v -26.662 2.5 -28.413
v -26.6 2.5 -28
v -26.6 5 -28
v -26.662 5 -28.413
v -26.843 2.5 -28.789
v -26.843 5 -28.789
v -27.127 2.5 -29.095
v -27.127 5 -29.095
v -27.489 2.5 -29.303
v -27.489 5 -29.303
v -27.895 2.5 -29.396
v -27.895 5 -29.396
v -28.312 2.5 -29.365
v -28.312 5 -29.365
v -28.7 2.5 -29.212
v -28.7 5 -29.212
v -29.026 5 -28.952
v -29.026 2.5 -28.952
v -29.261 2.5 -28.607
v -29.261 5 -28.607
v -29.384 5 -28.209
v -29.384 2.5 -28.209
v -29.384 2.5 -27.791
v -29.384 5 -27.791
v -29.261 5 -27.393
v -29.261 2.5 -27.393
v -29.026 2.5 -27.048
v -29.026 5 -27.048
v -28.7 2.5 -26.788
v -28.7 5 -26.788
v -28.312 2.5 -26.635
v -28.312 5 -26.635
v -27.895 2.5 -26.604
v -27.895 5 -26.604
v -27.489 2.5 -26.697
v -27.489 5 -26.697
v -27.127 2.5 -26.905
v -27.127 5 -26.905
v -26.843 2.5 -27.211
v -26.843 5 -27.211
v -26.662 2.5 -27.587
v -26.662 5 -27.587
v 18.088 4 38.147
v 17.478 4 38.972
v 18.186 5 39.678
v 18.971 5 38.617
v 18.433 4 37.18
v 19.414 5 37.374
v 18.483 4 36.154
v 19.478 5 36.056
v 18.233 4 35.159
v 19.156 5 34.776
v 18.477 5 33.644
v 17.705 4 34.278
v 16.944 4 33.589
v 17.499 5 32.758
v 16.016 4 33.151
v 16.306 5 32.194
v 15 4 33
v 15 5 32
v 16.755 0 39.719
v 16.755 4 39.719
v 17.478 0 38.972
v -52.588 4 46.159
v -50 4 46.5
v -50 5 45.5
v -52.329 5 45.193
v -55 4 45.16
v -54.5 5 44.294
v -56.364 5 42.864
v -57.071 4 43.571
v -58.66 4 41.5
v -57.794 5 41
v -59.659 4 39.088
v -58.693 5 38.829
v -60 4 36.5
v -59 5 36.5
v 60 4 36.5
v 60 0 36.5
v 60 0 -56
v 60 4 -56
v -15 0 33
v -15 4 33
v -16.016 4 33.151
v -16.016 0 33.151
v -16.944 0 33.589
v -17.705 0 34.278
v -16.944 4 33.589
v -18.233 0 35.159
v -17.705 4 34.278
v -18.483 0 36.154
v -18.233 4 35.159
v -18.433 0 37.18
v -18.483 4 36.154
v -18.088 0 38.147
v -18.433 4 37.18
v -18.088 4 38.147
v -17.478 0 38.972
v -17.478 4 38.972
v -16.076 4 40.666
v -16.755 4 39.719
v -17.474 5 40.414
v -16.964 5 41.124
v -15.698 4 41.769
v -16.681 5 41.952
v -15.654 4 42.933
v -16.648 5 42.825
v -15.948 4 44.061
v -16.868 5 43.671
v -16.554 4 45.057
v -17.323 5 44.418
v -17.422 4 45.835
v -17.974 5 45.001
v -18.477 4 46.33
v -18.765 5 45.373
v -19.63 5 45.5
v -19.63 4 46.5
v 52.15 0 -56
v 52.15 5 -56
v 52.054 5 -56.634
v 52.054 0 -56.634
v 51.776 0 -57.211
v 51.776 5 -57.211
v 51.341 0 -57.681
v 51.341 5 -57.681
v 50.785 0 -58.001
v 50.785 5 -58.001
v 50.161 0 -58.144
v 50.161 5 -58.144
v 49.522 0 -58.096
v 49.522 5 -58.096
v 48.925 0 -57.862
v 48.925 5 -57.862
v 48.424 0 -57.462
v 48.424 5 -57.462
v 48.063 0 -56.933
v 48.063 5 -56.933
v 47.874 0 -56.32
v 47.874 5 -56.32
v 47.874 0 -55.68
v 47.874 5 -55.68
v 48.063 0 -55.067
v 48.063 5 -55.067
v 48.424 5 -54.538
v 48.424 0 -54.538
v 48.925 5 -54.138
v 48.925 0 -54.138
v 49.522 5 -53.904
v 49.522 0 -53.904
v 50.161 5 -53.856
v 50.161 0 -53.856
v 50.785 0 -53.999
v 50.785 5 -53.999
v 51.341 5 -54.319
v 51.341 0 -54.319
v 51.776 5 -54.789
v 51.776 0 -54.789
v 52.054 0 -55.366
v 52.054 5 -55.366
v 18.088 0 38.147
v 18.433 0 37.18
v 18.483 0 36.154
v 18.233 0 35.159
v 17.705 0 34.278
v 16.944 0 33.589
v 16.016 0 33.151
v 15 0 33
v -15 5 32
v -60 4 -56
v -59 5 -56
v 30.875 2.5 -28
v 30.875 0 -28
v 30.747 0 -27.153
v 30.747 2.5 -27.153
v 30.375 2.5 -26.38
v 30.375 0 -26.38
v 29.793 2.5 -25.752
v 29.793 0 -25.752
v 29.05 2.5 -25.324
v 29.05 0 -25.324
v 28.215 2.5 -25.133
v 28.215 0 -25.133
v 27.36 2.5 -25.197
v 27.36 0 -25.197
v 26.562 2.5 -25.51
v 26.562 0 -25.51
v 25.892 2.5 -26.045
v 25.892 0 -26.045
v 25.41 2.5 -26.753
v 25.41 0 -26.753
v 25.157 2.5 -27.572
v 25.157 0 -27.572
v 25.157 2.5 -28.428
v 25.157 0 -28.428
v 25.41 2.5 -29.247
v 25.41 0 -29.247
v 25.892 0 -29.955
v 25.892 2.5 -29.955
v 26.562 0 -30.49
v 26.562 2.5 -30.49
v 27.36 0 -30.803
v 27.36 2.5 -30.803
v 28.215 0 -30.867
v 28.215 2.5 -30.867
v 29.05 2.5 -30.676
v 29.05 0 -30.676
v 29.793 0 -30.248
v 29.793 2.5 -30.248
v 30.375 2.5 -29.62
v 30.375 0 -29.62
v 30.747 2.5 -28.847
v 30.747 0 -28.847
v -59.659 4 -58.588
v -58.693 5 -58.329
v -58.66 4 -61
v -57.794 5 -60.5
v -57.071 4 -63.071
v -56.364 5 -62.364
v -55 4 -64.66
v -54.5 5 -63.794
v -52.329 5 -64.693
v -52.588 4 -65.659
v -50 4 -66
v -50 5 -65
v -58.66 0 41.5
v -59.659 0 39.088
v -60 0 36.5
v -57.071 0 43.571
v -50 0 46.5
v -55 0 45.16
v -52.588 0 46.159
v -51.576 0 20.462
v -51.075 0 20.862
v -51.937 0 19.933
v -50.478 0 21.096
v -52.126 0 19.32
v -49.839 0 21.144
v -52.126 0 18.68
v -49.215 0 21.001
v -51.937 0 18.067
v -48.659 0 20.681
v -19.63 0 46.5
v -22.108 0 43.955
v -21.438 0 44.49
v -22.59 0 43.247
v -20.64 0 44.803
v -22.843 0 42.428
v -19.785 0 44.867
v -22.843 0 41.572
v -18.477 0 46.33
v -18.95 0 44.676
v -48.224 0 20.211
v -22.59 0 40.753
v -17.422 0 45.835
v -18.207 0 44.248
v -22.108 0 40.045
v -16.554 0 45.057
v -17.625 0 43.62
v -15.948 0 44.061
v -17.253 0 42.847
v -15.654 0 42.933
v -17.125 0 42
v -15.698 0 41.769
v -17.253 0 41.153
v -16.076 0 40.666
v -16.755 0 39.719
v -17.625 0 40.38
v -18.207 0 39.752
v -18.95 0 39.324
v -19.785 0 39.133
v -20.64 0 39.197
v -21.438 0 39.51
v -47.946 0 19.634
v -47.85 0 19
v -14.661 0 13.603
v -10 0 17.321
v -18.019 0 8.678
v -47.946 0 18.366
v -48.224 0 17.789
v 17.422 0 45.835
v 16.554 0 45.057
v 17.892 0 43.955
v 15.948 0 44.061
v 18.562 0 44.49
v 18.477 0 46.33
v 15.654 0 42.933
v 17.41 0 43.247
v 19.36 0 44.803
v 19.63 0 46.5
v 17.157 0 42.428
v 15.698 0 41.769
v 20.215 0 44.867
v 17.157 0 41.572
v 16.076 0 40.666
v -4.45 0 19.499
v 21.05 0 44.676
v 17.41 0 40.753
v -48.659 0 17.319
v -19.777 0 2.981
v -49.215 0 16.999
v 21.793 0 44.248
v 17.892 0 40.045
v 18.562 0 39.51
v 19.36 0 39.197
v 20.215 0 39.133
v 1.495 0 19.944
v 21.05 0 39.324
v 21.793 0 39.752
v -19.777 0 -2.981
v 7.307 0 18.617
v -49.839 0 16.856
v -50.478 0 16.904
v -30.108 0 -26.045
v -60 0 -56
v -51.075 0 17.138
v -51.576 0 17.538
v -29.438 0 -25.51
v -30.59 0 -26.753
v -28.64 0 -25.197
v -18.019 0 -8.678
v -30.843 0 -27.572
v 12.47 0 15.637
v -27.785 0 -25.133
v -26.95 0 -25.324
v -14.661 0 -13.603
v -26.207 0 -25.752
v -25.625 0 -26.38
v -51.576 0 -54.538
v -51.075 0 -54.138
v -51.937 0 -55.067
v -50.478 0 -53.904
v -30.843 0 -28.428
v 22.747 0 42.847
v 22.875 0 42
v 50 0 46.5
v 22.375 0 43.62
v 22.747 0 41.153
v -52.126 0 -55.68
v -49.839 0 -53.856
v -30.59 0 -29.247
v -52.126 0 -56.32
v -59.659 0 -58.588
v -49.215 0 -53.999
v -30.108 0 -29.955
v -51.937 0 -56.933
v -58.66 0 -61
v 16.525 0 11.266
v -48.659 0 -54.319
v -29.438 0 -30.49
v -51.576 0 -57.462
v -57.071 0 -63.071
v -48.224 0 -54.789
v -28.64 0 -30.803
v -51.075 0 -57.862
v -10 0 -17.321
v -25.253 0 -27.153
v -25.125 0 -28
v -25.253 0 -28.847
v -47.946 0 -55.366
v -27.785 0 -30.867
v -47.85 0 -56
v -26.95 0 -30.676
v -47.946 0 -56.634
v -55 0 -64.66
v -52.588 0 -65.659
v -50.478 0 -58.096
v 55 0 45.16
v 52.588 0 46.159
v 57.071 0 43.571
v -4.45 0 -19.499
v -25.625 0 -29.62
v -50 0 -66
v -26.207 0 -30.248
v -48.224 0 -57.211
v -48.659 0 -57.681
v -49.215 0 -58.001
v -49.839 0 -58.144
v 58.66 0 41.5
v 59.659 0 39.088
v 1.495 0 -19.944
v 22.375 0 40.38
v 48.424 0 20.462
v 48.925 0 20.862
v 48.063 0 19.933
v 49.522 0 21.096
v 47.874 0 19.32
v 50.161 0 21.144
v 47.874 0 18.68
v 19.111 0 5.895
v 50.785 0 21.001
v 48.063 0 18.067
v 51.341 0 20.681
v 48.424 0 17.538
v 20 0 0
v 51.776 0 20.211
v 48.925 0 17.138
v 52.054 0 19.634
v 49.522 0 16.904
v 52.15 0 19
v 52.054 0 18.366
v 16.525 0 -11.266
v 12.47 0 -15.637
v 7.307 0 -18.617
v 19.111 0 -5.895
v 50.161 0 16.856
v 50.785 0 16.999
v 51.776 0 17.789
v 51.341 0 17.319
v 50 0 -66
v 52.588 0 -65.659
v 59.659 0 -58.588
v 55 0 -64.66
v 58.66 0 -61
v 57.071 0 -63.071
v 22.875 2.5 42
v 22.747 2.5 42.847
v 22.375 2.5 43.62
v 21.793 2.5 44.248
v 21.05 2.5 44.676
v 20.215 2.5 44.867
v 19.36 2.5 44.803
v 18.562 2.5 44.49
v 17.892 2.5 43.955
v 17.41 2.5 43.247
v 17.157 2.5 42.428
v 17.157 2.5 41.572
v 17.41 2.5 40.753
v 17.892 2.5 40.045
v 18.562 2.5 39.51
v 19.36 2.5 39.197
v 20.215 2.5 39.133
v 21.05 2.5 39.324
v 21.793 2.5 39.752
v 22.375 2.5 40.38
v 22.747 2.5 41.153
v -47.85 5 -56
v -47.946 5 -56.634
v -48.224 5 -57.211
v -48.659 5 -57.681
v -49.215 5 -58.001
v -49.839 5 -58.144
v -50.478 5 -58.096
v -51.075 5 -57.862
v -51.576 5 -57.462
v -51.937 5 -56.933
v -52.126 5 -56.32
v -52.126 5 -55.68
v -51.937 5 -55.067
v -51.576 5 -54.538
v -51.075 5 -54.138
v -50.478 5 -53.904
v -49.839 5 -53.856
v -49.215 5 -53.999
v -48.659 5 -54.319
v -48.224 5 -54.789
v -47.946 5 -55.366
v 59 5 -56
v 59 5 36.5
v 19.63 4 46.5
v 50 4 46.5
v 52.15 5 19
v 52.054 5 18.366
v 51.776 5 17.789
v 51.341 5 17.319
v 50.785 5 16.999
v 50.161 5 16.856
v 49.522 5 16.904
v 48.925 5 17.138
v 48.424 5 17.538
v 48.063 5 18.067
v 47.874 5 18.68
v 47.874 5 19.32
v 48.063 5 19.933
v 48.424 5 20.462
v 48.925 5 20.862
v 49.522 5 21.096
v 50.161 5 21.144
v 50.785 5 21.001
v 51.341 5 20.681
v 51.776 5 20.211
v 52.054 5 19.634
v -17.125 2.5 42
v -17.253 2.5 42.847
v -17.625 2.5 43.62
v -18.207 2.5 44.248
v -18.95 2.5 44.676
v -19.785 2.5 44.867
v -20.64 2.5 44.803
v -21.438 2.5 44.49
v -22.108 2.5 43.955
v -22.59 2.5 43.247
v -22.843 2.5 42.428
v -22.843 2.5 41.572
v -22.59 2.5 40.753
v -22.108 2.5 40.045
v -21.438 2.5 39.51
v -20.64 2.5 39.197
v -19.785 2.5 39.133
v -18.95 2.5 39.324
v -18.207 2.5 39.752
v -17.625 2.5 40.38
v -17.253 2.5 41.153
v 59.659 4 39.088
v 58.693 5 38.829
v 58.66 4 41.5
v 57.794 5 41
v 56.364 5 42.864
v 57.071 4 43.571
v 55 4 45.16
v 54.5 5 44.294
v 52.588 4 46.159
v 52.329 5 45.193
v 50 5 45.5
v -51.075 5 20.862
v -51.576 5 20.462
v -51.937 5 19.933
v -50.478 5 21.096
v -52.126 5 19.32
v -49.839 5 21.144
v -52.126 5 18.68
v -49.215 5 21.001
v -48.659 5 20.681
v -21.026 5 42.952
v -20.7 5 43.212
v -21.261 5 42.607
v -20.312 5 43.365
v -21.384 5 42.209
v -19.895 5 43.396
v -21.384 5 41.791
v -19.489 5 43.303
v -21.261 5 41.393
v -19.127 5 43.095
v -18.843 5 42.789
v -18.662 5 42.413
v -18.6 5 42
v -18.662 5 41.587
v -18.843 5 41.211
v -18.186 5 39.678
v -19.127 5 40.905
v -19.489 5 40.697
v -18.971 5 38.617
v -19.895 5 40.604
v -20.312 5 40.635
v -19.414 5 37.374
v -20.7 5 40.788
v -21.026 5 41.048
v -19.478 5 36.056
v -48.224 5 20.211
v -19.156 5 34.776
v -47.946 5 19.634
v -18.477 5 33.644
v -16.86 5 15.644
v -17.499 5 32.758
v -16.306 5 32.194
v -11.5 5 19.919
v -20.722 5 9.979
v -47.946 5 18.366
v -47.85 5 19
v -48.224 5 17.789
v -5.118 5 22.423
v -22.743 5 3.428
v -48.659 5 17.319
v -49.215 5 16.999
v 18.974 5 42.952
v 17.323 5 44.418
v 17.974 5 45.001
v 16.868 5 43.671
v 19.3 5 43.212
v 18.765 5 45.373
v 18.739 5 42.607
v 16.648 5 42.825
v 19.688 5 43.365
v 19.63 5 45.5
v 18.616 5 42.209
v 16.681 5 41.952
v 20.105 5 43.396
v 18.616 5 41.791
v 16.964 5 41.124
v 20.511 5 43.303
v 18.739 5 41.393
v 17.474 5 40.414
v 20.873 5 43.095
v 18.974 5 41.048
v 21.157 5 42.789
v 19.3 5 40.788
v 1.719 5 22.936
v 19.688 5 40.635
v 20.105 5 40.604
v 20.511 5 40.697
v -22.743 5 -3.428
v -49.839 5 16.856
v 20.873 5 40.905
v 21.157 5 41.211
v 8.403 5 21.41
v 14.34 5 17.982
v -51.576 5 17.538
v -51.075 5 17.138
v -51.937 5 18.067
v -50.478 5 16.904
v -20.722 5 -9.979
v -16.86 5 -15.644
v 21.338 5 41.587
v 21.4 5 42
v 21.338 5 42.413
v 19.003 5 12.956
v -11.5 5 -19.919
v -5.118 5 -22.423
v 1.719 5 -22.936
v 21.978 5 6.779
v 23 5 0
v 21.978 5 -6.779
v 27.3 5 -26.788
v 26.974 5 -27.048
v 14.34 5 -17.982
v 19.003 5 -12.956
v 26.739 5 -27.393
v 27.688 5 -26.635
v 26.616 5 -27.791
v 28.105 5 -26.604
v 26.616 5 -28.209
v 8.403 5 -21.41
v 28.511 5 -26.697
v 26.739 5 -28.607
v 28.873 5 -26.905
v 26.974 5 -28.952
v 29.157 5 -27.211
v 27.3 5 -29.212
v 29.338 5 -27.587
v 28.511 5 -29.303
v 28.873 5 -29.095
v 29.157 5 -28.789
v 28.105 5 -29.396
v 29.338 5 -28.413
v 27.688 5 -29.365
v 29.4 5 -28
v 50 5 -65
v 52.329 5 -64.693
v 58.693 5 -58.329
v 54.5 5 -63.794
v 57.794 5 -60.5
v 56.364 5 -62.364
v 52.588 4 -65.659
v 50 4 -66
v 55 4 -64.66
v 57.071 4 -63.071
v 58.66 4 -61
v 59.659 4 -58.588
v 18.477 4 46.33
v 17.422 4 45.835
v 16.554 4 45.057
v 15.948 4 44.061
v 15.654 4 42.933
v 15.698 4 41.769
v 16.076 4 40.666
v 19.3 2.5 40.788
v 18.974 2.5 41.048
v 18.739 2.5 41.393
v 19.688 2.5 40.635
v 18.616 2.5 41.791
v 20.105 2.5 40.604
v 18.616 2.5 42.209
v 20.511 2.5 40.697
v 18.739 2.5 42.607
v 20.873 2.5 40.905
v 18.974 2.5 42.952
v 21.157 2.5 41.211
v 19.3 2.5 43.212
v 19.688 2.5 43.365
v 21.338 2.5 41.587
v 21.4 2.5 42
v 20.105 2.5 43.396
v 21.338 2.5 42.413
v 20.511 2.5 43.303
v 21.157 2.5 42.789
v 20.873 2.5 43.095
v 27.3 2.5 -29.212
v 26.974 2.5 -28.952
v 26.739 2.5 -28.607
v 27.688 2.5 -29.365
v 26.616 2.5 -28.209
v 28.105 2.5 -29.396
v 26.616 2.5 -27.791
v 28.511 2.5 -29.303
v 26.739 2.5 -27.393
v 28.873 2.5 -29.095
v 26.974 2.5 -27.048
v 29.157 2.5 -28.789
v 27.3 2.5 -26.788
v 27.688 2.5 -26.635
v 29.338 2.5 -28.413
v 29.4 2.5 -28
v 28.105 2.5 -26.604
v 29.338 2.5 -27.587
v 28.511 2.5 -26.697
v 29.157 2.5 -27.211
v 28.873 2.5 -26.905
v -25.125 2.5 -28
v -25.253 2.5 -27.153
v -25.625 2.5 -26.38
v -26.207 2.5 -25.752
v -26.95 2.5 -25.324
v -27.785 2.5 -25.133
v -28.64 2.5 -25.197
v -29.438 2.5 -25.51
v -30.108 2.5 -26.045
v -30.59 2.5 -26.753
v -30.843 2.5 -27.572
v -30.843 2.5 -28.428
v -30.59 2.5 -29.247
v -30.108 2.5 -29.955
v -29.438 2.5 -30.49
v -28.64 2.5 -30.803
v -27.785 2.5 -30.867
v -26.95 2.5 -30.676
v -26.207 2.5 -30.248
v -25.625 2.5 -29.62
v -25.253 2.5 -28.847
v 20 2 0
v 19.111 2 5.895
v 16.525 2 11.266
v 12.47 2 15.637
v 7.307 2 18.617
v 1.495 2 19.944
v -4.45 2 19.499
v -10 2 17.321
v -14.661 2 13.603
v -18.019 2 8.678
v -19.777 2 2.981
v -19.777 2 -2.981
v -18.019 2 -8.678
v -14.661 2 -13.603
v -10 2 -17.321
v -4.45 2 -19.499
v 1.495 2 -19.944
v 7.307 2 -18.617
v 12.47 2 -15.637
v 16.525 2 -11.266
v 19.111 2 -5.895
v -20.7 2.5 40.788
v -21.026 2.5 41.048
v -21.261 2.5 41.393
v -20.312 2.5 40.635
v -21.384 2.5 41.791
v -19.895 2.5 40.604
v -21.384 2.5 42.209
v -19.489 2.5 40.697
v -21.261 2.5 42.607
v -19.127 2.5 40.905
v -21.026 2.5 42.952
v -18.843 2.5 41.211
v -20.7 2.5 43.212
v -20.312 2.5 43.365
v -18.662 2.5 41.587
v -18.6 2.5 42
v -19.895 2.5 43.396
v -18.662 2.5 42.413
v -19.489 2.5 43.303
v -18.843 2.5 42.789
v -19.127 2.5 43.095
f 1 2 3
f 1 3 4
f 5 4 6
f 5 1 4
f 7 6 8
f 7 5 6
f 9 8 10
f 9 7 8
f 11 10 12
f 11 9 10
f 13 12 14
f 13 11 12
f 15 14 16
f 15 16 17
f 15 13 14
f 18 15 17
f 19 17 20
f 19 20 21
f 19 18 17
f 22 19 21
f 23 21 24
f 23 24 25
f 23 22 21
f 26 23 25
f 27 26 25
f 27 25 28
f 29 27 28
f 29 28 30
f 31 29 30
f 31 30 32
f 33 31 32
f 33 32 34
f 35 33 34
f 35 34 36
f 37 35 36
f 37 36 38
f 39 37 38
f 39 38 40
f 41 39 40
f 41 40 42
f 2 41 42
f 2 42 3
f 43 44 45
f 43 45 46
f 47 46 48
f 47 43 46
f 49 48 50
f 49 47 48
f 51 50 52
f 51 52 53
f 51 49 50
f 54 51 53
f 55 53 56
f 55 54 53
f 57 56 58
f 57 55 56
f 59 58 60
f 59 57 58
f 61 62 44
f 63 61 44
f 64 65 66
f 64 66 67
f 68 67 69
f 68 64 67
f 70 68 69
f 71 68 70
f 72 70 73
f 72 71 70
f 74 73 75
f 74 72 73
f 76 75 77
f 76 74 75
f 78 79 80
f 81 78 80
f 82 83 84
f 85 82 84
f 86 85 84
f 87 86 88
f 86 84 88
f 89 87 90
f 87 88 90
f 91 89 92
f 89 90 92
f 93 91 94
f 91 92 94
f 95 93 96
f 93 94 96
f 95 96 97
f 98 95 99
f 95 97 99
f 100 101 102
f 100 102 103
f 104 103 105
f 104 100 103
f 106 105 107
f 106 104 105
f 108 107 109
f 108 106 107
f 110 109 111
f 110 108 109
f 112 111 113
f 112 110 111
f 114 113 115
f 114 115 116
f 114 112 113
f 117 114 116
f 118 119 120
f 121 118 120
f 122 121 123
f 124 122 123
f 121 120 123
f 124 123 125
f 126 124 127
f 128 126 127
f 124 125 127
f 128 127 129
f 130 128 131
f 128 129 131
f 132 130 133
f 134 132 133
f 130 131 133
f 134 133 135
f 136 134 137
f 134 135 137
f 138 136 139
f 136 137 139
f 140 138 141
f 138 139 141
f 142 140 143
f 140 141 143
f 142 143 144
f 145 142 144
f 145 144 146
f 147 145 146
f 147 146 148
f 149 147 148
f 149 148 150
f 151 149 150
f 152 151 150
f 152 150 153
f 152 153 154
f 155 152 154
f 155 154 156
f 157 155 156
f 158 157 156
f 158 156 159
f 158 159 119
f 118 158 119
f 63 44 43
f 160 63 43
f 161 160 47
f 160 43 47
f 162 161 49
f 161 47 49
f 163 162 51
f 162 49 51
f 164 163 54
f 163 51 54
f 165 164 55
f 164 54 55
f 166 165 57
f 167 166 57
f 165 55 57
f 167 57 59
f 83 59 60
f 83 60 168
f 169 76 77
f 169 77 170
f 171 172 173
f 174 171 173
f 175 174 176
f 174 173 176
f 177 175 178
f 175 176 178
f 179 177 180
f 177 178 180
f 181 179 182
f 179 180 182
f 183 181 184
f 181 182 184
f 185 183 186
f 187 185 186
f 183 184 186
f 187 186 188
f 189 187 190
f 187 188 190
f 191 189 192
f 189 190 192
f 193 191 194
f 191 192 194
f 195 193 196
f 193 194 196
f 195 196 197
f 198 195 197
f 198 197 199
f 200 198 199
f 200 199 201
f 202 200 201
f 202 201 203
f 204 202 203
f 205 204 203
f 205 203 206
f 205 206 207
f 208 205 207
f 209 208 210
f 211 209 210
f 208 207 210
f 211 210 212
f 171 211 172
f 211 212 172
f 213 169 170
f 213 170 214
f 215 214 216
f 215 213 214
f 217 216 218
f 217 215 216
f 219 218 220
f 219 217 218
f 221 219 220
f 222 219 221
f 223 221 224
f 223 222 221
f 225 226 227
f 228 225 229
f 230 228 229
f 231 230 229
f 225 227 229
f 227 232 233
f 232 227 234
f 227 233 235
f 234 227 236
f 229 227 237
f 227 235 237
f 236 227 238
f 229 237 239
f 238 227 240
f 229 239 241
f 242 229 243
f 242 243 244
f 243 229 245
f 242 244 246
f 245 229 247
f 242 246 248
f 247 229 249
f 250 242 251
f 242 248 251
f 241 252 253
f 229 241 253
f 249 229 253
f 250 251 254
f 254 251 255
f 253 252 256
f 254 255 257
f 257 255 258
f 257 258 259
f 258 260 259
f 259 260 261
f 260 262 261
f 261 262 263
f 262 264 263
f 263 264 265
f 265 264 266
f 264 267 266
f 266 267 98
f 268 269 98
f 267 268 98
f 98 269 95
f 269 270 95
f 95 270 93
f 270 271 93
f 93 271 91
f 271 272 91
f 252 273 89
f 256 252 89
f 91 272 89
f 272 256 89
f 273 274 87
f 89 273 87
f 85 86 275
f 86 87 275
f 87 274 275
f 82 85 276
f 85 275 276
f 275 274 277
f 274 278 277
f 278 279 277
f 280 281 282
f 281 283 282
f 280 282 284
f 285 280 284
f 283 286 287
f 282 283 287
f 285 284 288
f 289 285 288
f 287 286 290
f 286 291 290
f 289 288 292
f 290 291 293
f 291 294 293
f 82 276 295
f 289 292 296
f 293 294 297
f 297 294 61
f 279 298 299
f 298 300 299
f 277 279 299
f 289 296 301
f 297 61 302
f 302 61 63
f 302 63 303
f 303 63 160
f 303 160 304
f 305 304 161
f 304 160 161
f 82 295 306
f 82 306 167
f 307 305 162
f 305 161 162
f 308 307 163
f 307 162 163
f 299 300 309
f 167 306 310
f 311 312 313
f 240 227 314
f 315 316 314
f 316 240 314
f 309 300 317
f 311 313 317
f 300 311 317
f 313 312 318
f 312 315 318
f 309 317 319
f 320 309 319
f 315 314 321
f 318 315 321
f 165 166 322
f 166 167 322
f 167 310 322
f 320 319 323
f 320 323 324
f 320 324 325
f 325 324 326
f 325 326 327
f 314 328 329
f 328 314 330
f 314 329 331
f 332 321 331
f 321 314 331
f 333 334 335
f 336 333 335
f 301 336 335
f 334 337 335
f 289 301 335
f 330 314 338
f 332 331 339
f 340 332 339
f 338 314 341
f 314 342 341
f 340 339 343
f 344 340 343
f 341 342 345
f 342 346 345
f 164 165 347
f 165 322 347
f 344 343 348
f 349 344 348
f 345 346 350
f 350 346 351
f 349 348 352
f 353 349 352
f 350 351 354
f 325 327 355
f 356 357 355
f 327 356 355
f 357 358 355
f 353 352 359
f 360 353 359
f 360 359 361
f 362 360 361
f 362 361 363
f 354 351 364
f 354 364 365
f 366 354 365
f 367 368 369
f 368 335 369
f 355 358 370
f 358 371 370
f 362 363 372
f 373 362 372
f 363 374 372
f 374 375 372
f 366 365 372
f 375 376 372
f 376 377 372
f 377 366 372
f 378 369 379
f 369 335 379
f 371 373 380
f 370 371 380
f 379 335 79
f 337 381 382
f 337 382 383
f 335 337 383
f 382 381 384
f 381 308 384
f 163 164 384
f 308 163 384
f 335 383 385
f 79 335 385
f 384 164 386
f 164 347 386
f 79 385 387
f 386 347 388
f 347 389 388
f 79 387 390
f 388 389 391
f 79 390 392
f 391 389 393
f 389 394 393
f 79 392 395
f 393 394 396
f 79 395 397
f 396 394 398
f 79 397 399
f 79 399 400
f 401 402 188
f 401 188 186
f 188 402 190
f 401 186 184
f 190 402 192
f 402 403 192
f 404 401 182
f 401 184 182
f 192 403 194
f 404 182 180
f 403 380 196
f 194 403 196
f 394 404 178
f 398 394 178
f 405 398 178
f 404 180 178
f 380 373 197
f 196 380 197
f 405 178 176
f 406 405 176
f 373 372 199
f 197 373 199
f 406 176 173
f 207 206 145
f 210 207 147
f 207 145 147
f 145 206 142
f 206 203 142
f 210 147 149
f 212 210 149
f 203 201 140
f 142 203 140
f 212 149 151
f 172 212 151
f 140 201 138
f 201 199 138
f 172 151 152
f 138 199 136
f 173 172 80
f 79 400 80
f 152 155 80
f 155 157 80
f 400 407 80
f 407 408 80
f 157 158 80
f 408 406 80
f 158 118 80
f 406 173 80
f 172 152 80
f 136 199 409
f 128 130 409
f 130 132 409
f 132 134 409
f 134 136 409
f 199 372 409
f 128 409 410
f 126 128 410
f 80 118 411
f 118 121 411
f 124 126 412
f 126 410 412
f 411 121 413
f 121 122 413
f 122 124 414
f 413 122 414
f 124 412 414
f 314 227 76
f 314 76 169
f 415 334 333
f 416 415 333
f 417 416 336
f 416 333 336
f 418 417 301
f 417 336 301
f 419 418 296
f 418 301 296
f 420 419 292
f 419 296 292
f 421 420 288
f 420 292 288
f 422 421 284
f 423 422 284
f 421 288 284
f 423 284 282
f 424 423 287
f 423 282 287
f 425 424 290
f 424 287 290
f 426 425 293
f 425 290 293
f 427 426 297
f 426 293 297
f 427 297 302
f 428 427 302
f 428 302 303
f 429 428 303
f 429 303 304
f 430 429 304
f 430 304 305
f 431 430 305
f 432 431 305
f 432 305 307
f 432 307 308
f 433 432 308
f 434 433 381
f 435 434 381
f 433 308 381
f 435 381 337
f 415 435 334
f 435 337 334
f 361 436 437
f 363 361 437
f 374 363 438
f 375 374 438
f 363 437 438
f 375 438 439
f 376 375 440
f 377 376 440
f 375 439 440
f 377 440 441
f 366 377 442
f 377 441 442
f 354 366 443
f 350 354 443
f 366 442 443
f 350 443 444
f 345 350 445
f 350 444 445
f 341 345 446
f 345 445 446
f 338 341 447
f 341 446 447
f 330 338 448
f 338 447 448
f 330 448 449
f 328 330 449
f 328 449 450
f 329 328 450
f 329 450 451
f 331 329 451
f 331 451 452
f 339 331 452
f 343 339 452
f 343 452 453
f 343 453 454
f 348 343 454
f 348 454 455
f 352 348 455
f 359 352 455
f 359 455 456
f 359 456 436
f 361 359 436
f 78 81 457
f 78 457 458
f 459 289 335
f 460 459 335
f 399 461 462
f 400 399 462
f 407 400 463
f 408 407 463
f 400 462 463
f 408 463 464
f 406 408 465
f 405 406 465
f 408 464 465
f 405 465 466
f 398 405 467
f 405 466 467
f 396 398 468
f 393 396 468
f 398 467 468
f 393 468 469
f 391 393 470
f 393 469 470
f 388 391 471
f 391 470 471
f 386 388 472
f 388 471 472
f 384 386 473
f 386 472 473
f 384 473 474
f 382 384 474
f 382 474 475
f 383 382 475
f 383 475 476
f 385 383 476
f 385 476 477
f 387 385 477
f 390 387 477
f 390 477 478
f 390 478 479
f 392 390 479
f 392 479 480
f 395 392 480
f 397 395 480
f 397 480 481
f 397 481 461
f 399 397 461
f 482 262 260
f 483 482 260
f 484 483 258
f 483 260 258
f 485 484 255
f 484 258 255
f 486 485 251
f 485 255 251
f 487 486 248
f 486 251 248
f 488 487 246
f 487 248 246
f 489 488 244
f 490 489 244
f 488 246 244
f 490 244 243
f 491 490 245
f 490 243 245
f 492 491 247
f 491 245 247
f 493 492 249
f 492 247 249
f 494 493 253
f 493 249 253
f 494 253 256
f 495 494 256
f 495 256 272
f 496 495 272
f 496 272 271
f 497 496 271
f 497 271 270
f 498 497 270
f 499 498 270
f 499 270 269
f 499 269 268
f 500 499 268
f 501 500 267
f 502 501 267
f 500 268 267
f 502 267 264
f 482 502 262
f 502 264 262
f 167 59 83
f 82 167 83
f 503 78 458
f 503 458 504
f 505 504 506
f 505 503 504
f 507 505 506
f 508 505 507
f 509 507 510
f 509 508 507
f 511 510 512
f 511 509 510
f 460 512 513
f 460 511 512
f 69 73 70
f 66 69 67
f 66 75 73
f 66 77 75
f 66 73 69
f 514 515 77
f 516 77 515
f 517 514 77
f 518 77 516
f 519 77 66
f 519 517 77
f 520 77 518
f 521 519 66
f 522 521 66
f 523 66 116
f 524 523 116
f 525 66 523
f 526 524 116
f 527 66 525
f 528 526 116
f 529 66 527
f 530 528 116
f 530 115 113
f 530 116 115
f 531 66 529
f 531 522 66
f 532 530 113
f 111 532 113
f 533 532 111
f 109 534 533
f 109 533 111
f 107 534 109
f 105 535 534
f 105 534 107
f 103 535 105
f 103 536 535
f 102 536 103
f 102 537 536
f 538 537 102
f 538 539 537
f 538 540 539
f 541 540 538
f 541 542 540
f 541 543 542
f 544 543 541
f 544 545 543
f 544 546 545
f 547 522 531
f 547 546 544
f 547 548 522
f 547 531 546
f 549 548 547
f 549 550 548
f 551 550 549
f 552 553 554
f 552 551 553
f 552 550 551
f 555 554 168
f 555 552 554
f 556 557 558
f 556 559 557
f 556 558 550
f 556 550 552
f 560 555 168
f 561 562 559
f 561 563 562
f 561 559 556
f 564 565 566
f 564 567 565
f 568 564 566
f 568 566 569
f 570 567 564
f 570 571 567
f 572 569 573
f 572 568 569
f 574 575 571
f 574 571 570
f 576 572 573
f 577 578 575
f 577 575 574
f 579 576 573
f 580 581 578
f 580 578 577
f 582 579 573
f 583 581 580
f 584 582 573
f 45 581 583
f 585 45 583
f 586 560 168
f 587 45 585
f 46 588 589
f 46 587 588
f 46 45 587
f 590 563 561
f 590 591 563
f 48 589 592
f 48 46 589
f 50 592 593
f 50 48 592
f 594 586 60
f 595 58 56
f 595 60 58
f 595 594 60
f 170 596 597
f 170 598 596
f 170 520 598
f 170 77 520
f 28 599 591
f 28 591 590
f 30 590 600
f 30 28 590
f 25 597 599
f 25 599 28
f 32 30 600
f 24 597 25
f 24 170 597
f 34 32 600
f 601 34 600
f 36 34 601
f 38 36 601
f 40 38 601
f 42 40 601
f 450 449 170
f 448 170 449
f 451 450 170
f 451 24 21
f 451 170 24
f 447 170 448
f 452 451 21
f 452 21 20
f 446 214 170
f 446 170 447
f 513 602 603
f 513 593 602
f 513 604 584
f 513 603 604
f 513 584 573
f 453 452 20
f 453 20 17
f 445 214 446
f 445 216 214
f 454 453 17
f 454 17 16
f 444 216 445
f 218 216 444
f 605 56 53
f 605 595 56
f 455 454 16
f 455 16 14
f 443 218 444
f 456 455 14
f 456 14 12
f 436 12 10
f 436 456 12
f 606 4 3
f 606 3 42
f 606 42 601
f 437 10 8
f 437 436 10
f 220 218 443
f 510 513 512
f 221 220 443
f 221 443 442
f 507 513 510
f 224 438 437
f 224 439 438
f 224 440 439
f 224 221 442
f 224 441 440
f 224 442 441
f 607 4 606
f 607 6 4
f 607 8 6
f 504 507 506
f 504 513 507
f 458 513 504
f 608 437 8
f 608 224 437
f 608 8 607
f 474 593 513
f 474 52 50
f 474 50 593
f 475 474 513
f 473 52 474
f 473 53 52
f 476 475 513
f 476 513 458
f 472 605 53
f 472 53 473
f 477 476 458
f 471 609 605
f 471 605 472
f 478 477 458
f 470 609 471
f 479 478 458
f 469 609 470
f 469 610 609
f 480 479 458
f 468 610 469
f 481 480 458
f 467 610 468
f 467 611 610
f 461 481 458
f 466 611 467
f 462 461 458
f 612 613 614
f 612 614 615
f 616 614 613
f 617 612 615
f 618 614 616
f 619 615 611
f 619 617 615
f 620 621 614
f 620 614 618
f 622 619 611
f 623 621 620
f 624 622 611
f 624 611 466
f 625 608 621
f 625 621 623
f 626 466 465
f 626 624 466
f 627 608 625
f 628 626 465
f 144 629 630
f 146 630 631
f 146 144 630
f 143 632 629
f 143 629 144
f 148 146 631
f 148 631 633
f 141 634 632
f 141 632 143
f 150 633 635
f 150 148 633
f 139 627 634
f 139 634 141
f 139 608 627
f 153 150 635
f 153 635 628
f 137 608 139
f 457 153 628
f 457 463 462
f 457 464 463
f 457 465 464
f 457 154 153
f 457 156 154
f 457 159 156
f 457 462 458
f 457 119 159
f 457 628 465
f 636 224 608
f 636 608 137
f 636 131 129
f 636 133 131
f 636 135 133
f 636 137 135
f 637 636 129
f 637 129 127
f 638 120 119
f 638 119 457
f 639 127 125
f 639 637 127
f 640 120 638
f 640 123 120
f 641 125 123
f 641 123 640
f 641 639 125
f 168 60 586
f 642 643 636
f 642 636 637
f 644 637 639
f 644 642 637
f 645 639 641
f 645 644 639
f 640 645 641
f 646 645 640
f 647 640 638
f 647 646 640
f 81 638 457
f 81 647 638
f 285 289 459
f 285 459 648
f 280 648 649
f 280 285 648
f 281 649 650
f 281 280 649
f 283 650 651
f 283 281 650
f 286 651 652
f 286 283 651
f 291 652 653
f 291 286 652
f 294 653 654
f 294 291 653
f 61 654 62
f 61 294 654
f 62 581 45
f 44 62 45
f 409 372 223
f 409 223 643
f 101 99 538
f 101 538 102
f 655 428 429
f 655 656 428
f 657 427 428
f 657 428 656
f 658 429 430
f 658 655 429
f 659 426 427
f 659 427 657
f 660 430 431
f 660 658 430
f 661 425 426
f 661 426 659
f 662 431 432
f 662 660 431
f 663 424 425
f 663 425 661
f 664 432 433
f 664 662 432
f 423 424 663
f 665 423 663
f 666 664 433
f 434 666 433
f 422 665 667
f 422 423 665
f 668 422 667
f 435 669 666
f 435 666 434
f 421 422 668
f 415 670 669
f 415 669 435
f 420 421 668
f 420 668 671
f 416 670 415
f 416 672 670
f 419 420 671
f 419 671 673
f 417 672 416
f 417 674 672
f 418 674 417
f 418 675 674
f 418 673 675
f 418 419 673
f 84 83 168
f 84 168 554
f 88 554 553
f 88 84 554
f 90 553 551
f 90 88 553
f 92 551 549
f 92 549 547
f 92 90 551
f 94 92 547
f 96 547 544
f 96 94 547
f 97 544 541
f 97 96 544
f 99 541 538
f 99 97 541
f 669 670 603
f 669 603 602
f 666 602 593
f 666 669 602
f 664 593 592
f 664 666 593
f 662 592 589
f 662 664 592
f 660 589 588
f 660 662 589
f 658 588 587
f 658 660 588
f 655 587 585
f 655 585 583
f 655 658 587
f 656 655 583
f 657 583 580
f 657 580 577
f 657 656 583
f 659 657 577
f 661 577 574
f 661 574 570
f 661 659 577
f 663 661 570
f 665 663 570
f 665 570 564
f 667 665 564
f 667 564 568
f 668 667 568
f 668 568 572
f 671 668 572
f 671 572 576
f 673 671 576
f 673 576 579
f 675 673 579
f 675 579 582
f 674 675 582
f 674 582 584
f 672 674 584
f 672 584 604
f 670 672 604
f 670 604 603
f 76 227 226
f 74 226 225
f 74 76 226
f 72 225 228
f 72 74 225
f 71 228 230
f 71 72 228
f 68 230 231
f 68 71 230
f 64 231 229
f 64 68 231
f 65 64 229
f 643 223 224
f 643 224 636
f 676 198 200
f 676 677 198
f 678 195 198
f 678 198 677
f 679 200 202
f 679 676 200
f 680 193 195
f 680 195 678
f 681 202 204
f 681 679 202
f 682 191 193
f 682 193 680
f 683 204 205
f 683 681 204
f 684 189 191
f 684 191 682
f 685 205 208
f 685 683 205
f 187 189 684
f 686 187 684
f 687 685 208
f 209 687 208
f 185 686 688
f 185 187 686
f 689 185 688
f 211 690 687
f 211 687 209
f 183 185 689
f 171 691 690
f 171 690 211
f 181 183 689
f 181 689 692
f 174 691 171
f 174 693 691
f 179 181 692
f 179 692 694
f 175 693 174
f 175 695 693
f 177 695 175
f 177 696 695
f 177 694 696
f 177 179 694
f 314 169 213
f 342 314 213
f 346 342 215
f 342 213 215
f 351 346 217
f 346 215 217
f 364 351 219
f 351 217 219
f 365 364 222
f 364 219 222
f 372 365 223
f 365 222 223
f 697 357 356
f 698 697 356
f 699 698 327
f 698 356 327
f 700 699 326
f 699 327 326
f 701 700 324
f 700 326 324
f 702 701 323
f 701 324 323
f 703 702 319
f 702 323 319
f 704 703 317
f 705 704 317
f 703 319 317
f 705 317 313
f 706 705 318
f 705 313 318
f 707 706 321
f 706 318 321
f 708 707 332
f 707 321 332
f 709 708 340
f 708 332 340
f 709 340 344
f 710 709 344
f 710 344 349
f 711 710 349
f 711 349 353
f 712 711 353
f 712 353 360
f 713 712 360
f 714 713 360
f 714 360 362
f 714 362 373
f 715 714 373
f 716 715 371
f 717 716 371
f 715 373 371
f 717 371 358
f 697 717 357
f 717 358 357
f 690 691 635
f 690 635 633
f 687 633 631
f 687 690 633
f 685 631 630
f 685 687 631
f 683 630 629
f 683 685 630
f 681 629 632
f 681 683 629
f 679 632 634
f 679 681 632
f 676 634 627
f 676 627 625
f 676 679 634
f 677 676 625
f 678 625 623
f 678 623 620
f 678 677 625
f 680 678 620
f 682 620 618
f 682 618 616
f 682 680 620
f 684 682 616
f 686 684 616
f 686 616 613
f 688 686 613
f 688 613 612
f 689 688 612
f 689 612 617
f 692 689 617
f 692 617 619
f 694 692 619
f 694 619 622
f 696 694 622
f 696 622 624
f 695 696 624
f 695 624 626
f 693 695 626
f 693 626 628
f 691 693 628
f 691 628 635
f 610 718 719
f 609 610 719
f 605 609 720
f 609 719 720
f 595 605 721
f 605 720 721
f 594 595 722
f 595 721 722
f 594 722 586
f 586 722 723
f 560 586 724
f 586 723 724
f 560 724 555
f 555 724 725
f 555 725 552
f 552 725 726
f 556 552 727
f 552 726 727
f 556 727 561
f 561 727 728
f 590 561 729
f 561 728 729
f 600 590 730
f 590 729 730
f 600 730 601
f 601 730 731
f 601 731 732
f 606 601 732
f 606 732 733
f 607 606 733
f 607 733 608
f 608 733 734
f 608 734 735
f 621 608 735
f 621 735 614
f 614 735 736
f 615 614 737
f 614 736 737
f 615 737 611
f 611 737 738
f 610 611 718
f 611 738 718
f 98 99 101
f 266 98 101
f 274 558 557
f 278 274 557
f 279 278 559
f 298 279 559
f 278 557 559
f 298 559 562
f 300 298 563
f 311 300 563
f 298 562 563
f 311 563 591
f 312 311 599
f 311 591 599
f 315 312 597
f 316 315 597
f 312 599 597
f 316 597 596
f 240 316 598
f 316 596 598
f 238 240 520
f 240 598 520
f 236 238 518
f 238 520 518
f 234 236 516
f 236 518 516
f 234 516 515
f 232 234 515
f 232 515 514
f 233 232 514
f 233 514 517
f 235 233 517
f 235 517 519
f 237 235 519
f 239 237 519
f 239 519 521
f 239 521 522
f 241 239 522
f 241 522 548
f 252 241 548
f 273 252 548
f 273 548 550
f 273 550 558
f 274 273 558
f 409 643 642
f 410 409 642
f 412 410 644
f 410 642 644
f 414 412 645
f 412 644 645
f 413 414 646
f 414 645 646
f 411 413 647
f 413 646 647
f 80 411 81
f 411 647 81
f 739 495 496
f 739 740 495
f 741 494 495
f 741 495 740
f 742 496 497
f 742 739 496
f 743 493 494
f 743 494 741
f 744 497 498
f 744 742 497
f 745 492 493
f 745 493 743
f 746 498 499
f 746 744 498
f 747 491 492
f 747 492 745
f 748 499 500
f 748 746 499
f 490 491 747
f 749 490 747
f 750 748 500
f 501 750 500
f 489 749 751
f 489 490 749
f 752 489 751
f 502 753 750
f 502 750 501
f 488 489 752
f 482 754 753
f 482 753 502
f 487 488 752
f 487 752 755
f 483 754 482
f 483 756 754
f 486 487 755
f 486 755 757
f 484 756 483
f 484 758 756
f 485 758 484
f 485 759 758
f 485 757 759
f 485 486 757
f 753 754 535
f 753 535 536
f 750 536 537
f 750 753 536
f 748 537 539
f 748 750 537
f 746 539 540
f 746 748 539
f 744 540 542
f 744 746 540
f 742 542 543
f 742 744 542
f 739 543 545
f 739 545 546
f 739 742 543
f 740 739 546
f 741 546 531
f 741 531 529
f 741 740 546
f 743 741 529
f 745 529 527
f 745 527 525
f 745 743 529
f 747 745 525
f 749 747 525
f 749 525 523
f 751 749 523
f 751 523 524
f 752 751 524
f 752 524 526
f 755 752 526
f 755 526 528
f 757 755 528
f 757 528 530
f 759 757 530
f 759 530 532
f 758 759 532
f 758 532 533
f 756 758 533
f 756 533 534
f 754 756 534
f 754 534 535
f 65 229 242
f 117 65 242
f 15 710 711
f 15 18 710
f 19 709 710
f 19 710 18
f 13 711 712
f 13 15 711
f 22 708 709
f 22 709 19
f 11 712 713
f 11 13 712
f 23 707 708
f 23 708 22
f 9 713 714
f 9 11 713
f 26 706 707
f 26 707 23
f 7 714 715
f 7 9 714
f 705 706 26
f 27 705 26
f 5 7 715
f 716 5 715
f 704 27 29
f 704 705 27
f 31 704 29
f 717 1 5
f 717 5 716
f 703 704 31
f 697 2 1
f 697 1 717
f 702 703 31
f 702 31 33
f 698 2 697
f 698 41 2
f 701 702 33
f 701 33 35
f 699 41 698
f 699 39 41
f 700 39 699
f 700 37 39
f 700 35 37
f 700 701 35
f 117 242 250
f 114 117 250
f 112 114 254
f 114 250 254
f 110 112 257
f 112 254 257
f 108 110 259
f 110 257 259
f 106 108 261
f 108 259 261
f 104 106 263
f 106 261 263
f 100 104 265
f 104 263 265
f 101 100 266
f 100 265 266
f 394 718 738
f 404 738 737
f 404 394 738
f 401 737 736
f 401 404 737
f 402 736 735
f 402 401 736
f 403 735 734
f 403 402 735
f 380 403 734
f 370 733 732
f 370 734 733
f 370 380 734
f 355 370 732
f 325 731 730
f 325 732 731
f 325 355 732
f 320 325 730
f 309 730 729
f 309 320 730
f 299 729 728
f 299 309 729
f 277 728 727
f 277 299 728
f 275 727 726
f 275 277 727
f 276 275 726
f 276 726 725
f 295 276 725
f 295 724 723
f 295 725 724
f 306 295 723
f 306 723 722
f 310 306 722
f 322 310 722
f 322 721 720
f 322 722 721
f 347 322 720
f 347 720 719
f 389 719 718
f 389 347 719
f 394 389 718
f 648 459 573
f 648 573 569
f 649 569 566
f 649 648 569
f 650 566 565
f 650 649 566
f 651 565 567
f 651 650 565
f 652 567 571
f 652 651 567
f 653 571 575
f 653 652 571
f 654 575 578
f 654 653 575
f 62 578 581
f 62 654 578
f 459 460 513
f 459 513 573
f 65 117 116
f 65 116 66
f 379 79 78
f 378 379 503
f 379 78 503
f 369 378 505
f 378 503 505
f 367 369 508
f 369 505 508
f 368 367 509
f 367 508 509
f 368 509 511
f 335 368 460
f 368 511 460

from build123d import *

# Parameters (mm, degrees)
SKETCH2_W           = 120
SKETCH2_H           = 112.5
BOSS_EXTRUDE2_DEPTH = 5
CUT_EXTRUDE7_DEPTH  = 6
FILLET5_R           = 10
SKETCH10_R          = 20
CUT_EXTRUDE9_DEPTH  = 6
CHAMFER3_SIZE       = 3
FILLET6_R           = 4
CHAMFER4_SIZE       = 1
SKETCH11_R          = 2.15
CUT_EXTRUDE10_DEPTH = 6
SKETCH1_R           = 1.4
CUT_EXTRUDE13_DEPTH = 5
SKETCH13_R          = 2.875
CUT_EXTRUDE12_DEPTH = 2.5


with BuildPart() as part:
    # Sketch2 → Boss-Extrude2 (new body)
    with BuildSketch(Plane(origin=(0, 0, 0), x_dir=(1, 0, 0), z_dir=(0, 1, 0))):
        with Locations((0, 9.75)):
            Rectangle(SKETCH2_W, SKETCH2_H)
    extrude(amount=BOSS_EXTRUDE2_DEPTH)

    # Sketch9 → Cut-Extrude7 (cut, through all)
    with BuildSketch(Plane(origin=(0, 5, 0), x_dir=(1, 0, 0), z_dir=(0, 1, 0))):
        with BuildLine():
            ThreePointArc((-15, -33), (-18.232806931, -35.158747099), (-17.477720957, -38.972023232))
            Line((-17.477720957, -38.972023232), (-10.196302495, -46.5))
            Line((-10.196302495, -46.5), (10.196302495, -46.5))
            Line((10.196302495, -46.5), (17.477720957, -38.972023232))
            ThreePointArc((17.477720957, -38.972023232), (18.232806931, -35.158747099), (15, -33))
            Line((15, -33), (-15, -33))
        make_face()
    extrude(amount=-CUT_EXTRUDE7_DEPTH, mode=Mode.SUBTRACT)

    # Fillet5
    fillet5_edges = [part.edges().sort_by_distance(p)[0] for p in [
        (-60, 2.5, -66),
        (60, 2.5, -66),
        (60, 2.5, 46.5),
        (-60, 2.5, 46.5),
    ]]
    fillet(fillet5_edges, radius=FILLET5_R)

    # Sketch10 → Cut-Extrude9 (cut, through all)
    with BuildSketch(Plane(origin=(0, 0, 0), x_dir=(1, 0, 0), z_dir=(0, 1, 0))):
        Circle(SKETCH10_R)
    extrude(amount=CUT_EXTRUDE9_DEPTH, mode=Mode.SUBTRACT)

    # Chamfer3
    chamfer3_edges = [part.edges().sort_by_distance(p)[0] for p in [
        (-20, 5, 0),
    ]]
    chamfer(chamfer3_edges, length=CHAMFER3_SIZE)

    # Fillet6
    fillet6_edges = [part.edges().sort_by_distance(p)[0] for p in [
        (10.196302495, 2.5, 46.5),
        (-10.196302495, 2.5, 46.5),
    ]]
    fillet(fillet6_edges, radius=FILLET6_R)

    # Chamfer4
    chamfer4_edges = [part.edges().sort_by_distance(p)[0] for p in [
        (18.232806931, 5, 35.158747099),
        (17.116441895, 5, 39.345535673),
        (-18.232806931, 5, 35.158747099),
        (0, 5, 33),
        (-17.116441895, 5, 39.345535673),
        (-60, 5, -9.75),
        (0, 5, -66),
        (60, 5, -9.75),
        (-34.815140686, 5, 46.5),
        (-57.071067812, 5, 43.571067812),
        (57.071067812, 5, 43.571067812),
        (57.071067812, 5, -63.071067812),
        (-57.071067812, 5, -63.071067812),
        (34.815140686, 5, 46.5),
        (15.947632356, 5, 44.061440433),
        (-15.947632356, 5, 44.061440433),
    ]]
    chamfer(chamfer4_edges, length=CHAMFER4_SIZE)

    # Sketch11 → Cut-Extrude10 (cut, through all)
    with BuildSketch(Plane(origin=(0, 5, 0), x_dir=(1, 0, 0), z_dir=(0, 1, 0))):
        with Locations((-50, 56)):
            Circle(SKETCH11_R)
        with Locations((50, 56)):
            Circle(SKETCH11_R)
        with Locations((-50, -19)):
            Circle(SKETCH11_R)
        with Locations((50, -19)):
            Circle(SKETCH11_R)
    extrude(amount=-CUT_EXTRUDE10_DEPTH, mode=Mode.SUBTRACT)

    # Sketch1 → Cut-Extrude13 (cut)
    with BuildSketch(Plane(origin=(0, 0, 0), x_dir=(1, 0, 0), z_dir=(0, 1, 0))):
        with Locations((-20, -42)):
            Circle(SKETCH1_R)
        with Locations((20, -42)):
            Circle(SKETCH1_R)
        with Locations((28, 28)):
            Circle(SKETCH1_R)
        with Locations((-28, 28)):
            Circle(SKETCH1_R)
    extrude(amount=CUT_EXTRUDE13_DEPTH, mode=Mode.SUBTRACT)

    # Sketch13 → Cut-Extrude12 (cut)
    with BuildSketch(Plane.XZ):
        with Locations((-20, 42)):
            Circle(SKETCH13_R)
        with Locations((20, 42)):
            Circle(SKETCH13_R)
        with Locations((-28, -28)):
            Circle(SKETCH13_R)
        with Locations((28, -28)):
            Circle(SKETCH13_R)
    extrude(amount=-CUT_EXTRUDE12_DEPTH, mode=Mode.SUBTRACT)


solid = part.part
